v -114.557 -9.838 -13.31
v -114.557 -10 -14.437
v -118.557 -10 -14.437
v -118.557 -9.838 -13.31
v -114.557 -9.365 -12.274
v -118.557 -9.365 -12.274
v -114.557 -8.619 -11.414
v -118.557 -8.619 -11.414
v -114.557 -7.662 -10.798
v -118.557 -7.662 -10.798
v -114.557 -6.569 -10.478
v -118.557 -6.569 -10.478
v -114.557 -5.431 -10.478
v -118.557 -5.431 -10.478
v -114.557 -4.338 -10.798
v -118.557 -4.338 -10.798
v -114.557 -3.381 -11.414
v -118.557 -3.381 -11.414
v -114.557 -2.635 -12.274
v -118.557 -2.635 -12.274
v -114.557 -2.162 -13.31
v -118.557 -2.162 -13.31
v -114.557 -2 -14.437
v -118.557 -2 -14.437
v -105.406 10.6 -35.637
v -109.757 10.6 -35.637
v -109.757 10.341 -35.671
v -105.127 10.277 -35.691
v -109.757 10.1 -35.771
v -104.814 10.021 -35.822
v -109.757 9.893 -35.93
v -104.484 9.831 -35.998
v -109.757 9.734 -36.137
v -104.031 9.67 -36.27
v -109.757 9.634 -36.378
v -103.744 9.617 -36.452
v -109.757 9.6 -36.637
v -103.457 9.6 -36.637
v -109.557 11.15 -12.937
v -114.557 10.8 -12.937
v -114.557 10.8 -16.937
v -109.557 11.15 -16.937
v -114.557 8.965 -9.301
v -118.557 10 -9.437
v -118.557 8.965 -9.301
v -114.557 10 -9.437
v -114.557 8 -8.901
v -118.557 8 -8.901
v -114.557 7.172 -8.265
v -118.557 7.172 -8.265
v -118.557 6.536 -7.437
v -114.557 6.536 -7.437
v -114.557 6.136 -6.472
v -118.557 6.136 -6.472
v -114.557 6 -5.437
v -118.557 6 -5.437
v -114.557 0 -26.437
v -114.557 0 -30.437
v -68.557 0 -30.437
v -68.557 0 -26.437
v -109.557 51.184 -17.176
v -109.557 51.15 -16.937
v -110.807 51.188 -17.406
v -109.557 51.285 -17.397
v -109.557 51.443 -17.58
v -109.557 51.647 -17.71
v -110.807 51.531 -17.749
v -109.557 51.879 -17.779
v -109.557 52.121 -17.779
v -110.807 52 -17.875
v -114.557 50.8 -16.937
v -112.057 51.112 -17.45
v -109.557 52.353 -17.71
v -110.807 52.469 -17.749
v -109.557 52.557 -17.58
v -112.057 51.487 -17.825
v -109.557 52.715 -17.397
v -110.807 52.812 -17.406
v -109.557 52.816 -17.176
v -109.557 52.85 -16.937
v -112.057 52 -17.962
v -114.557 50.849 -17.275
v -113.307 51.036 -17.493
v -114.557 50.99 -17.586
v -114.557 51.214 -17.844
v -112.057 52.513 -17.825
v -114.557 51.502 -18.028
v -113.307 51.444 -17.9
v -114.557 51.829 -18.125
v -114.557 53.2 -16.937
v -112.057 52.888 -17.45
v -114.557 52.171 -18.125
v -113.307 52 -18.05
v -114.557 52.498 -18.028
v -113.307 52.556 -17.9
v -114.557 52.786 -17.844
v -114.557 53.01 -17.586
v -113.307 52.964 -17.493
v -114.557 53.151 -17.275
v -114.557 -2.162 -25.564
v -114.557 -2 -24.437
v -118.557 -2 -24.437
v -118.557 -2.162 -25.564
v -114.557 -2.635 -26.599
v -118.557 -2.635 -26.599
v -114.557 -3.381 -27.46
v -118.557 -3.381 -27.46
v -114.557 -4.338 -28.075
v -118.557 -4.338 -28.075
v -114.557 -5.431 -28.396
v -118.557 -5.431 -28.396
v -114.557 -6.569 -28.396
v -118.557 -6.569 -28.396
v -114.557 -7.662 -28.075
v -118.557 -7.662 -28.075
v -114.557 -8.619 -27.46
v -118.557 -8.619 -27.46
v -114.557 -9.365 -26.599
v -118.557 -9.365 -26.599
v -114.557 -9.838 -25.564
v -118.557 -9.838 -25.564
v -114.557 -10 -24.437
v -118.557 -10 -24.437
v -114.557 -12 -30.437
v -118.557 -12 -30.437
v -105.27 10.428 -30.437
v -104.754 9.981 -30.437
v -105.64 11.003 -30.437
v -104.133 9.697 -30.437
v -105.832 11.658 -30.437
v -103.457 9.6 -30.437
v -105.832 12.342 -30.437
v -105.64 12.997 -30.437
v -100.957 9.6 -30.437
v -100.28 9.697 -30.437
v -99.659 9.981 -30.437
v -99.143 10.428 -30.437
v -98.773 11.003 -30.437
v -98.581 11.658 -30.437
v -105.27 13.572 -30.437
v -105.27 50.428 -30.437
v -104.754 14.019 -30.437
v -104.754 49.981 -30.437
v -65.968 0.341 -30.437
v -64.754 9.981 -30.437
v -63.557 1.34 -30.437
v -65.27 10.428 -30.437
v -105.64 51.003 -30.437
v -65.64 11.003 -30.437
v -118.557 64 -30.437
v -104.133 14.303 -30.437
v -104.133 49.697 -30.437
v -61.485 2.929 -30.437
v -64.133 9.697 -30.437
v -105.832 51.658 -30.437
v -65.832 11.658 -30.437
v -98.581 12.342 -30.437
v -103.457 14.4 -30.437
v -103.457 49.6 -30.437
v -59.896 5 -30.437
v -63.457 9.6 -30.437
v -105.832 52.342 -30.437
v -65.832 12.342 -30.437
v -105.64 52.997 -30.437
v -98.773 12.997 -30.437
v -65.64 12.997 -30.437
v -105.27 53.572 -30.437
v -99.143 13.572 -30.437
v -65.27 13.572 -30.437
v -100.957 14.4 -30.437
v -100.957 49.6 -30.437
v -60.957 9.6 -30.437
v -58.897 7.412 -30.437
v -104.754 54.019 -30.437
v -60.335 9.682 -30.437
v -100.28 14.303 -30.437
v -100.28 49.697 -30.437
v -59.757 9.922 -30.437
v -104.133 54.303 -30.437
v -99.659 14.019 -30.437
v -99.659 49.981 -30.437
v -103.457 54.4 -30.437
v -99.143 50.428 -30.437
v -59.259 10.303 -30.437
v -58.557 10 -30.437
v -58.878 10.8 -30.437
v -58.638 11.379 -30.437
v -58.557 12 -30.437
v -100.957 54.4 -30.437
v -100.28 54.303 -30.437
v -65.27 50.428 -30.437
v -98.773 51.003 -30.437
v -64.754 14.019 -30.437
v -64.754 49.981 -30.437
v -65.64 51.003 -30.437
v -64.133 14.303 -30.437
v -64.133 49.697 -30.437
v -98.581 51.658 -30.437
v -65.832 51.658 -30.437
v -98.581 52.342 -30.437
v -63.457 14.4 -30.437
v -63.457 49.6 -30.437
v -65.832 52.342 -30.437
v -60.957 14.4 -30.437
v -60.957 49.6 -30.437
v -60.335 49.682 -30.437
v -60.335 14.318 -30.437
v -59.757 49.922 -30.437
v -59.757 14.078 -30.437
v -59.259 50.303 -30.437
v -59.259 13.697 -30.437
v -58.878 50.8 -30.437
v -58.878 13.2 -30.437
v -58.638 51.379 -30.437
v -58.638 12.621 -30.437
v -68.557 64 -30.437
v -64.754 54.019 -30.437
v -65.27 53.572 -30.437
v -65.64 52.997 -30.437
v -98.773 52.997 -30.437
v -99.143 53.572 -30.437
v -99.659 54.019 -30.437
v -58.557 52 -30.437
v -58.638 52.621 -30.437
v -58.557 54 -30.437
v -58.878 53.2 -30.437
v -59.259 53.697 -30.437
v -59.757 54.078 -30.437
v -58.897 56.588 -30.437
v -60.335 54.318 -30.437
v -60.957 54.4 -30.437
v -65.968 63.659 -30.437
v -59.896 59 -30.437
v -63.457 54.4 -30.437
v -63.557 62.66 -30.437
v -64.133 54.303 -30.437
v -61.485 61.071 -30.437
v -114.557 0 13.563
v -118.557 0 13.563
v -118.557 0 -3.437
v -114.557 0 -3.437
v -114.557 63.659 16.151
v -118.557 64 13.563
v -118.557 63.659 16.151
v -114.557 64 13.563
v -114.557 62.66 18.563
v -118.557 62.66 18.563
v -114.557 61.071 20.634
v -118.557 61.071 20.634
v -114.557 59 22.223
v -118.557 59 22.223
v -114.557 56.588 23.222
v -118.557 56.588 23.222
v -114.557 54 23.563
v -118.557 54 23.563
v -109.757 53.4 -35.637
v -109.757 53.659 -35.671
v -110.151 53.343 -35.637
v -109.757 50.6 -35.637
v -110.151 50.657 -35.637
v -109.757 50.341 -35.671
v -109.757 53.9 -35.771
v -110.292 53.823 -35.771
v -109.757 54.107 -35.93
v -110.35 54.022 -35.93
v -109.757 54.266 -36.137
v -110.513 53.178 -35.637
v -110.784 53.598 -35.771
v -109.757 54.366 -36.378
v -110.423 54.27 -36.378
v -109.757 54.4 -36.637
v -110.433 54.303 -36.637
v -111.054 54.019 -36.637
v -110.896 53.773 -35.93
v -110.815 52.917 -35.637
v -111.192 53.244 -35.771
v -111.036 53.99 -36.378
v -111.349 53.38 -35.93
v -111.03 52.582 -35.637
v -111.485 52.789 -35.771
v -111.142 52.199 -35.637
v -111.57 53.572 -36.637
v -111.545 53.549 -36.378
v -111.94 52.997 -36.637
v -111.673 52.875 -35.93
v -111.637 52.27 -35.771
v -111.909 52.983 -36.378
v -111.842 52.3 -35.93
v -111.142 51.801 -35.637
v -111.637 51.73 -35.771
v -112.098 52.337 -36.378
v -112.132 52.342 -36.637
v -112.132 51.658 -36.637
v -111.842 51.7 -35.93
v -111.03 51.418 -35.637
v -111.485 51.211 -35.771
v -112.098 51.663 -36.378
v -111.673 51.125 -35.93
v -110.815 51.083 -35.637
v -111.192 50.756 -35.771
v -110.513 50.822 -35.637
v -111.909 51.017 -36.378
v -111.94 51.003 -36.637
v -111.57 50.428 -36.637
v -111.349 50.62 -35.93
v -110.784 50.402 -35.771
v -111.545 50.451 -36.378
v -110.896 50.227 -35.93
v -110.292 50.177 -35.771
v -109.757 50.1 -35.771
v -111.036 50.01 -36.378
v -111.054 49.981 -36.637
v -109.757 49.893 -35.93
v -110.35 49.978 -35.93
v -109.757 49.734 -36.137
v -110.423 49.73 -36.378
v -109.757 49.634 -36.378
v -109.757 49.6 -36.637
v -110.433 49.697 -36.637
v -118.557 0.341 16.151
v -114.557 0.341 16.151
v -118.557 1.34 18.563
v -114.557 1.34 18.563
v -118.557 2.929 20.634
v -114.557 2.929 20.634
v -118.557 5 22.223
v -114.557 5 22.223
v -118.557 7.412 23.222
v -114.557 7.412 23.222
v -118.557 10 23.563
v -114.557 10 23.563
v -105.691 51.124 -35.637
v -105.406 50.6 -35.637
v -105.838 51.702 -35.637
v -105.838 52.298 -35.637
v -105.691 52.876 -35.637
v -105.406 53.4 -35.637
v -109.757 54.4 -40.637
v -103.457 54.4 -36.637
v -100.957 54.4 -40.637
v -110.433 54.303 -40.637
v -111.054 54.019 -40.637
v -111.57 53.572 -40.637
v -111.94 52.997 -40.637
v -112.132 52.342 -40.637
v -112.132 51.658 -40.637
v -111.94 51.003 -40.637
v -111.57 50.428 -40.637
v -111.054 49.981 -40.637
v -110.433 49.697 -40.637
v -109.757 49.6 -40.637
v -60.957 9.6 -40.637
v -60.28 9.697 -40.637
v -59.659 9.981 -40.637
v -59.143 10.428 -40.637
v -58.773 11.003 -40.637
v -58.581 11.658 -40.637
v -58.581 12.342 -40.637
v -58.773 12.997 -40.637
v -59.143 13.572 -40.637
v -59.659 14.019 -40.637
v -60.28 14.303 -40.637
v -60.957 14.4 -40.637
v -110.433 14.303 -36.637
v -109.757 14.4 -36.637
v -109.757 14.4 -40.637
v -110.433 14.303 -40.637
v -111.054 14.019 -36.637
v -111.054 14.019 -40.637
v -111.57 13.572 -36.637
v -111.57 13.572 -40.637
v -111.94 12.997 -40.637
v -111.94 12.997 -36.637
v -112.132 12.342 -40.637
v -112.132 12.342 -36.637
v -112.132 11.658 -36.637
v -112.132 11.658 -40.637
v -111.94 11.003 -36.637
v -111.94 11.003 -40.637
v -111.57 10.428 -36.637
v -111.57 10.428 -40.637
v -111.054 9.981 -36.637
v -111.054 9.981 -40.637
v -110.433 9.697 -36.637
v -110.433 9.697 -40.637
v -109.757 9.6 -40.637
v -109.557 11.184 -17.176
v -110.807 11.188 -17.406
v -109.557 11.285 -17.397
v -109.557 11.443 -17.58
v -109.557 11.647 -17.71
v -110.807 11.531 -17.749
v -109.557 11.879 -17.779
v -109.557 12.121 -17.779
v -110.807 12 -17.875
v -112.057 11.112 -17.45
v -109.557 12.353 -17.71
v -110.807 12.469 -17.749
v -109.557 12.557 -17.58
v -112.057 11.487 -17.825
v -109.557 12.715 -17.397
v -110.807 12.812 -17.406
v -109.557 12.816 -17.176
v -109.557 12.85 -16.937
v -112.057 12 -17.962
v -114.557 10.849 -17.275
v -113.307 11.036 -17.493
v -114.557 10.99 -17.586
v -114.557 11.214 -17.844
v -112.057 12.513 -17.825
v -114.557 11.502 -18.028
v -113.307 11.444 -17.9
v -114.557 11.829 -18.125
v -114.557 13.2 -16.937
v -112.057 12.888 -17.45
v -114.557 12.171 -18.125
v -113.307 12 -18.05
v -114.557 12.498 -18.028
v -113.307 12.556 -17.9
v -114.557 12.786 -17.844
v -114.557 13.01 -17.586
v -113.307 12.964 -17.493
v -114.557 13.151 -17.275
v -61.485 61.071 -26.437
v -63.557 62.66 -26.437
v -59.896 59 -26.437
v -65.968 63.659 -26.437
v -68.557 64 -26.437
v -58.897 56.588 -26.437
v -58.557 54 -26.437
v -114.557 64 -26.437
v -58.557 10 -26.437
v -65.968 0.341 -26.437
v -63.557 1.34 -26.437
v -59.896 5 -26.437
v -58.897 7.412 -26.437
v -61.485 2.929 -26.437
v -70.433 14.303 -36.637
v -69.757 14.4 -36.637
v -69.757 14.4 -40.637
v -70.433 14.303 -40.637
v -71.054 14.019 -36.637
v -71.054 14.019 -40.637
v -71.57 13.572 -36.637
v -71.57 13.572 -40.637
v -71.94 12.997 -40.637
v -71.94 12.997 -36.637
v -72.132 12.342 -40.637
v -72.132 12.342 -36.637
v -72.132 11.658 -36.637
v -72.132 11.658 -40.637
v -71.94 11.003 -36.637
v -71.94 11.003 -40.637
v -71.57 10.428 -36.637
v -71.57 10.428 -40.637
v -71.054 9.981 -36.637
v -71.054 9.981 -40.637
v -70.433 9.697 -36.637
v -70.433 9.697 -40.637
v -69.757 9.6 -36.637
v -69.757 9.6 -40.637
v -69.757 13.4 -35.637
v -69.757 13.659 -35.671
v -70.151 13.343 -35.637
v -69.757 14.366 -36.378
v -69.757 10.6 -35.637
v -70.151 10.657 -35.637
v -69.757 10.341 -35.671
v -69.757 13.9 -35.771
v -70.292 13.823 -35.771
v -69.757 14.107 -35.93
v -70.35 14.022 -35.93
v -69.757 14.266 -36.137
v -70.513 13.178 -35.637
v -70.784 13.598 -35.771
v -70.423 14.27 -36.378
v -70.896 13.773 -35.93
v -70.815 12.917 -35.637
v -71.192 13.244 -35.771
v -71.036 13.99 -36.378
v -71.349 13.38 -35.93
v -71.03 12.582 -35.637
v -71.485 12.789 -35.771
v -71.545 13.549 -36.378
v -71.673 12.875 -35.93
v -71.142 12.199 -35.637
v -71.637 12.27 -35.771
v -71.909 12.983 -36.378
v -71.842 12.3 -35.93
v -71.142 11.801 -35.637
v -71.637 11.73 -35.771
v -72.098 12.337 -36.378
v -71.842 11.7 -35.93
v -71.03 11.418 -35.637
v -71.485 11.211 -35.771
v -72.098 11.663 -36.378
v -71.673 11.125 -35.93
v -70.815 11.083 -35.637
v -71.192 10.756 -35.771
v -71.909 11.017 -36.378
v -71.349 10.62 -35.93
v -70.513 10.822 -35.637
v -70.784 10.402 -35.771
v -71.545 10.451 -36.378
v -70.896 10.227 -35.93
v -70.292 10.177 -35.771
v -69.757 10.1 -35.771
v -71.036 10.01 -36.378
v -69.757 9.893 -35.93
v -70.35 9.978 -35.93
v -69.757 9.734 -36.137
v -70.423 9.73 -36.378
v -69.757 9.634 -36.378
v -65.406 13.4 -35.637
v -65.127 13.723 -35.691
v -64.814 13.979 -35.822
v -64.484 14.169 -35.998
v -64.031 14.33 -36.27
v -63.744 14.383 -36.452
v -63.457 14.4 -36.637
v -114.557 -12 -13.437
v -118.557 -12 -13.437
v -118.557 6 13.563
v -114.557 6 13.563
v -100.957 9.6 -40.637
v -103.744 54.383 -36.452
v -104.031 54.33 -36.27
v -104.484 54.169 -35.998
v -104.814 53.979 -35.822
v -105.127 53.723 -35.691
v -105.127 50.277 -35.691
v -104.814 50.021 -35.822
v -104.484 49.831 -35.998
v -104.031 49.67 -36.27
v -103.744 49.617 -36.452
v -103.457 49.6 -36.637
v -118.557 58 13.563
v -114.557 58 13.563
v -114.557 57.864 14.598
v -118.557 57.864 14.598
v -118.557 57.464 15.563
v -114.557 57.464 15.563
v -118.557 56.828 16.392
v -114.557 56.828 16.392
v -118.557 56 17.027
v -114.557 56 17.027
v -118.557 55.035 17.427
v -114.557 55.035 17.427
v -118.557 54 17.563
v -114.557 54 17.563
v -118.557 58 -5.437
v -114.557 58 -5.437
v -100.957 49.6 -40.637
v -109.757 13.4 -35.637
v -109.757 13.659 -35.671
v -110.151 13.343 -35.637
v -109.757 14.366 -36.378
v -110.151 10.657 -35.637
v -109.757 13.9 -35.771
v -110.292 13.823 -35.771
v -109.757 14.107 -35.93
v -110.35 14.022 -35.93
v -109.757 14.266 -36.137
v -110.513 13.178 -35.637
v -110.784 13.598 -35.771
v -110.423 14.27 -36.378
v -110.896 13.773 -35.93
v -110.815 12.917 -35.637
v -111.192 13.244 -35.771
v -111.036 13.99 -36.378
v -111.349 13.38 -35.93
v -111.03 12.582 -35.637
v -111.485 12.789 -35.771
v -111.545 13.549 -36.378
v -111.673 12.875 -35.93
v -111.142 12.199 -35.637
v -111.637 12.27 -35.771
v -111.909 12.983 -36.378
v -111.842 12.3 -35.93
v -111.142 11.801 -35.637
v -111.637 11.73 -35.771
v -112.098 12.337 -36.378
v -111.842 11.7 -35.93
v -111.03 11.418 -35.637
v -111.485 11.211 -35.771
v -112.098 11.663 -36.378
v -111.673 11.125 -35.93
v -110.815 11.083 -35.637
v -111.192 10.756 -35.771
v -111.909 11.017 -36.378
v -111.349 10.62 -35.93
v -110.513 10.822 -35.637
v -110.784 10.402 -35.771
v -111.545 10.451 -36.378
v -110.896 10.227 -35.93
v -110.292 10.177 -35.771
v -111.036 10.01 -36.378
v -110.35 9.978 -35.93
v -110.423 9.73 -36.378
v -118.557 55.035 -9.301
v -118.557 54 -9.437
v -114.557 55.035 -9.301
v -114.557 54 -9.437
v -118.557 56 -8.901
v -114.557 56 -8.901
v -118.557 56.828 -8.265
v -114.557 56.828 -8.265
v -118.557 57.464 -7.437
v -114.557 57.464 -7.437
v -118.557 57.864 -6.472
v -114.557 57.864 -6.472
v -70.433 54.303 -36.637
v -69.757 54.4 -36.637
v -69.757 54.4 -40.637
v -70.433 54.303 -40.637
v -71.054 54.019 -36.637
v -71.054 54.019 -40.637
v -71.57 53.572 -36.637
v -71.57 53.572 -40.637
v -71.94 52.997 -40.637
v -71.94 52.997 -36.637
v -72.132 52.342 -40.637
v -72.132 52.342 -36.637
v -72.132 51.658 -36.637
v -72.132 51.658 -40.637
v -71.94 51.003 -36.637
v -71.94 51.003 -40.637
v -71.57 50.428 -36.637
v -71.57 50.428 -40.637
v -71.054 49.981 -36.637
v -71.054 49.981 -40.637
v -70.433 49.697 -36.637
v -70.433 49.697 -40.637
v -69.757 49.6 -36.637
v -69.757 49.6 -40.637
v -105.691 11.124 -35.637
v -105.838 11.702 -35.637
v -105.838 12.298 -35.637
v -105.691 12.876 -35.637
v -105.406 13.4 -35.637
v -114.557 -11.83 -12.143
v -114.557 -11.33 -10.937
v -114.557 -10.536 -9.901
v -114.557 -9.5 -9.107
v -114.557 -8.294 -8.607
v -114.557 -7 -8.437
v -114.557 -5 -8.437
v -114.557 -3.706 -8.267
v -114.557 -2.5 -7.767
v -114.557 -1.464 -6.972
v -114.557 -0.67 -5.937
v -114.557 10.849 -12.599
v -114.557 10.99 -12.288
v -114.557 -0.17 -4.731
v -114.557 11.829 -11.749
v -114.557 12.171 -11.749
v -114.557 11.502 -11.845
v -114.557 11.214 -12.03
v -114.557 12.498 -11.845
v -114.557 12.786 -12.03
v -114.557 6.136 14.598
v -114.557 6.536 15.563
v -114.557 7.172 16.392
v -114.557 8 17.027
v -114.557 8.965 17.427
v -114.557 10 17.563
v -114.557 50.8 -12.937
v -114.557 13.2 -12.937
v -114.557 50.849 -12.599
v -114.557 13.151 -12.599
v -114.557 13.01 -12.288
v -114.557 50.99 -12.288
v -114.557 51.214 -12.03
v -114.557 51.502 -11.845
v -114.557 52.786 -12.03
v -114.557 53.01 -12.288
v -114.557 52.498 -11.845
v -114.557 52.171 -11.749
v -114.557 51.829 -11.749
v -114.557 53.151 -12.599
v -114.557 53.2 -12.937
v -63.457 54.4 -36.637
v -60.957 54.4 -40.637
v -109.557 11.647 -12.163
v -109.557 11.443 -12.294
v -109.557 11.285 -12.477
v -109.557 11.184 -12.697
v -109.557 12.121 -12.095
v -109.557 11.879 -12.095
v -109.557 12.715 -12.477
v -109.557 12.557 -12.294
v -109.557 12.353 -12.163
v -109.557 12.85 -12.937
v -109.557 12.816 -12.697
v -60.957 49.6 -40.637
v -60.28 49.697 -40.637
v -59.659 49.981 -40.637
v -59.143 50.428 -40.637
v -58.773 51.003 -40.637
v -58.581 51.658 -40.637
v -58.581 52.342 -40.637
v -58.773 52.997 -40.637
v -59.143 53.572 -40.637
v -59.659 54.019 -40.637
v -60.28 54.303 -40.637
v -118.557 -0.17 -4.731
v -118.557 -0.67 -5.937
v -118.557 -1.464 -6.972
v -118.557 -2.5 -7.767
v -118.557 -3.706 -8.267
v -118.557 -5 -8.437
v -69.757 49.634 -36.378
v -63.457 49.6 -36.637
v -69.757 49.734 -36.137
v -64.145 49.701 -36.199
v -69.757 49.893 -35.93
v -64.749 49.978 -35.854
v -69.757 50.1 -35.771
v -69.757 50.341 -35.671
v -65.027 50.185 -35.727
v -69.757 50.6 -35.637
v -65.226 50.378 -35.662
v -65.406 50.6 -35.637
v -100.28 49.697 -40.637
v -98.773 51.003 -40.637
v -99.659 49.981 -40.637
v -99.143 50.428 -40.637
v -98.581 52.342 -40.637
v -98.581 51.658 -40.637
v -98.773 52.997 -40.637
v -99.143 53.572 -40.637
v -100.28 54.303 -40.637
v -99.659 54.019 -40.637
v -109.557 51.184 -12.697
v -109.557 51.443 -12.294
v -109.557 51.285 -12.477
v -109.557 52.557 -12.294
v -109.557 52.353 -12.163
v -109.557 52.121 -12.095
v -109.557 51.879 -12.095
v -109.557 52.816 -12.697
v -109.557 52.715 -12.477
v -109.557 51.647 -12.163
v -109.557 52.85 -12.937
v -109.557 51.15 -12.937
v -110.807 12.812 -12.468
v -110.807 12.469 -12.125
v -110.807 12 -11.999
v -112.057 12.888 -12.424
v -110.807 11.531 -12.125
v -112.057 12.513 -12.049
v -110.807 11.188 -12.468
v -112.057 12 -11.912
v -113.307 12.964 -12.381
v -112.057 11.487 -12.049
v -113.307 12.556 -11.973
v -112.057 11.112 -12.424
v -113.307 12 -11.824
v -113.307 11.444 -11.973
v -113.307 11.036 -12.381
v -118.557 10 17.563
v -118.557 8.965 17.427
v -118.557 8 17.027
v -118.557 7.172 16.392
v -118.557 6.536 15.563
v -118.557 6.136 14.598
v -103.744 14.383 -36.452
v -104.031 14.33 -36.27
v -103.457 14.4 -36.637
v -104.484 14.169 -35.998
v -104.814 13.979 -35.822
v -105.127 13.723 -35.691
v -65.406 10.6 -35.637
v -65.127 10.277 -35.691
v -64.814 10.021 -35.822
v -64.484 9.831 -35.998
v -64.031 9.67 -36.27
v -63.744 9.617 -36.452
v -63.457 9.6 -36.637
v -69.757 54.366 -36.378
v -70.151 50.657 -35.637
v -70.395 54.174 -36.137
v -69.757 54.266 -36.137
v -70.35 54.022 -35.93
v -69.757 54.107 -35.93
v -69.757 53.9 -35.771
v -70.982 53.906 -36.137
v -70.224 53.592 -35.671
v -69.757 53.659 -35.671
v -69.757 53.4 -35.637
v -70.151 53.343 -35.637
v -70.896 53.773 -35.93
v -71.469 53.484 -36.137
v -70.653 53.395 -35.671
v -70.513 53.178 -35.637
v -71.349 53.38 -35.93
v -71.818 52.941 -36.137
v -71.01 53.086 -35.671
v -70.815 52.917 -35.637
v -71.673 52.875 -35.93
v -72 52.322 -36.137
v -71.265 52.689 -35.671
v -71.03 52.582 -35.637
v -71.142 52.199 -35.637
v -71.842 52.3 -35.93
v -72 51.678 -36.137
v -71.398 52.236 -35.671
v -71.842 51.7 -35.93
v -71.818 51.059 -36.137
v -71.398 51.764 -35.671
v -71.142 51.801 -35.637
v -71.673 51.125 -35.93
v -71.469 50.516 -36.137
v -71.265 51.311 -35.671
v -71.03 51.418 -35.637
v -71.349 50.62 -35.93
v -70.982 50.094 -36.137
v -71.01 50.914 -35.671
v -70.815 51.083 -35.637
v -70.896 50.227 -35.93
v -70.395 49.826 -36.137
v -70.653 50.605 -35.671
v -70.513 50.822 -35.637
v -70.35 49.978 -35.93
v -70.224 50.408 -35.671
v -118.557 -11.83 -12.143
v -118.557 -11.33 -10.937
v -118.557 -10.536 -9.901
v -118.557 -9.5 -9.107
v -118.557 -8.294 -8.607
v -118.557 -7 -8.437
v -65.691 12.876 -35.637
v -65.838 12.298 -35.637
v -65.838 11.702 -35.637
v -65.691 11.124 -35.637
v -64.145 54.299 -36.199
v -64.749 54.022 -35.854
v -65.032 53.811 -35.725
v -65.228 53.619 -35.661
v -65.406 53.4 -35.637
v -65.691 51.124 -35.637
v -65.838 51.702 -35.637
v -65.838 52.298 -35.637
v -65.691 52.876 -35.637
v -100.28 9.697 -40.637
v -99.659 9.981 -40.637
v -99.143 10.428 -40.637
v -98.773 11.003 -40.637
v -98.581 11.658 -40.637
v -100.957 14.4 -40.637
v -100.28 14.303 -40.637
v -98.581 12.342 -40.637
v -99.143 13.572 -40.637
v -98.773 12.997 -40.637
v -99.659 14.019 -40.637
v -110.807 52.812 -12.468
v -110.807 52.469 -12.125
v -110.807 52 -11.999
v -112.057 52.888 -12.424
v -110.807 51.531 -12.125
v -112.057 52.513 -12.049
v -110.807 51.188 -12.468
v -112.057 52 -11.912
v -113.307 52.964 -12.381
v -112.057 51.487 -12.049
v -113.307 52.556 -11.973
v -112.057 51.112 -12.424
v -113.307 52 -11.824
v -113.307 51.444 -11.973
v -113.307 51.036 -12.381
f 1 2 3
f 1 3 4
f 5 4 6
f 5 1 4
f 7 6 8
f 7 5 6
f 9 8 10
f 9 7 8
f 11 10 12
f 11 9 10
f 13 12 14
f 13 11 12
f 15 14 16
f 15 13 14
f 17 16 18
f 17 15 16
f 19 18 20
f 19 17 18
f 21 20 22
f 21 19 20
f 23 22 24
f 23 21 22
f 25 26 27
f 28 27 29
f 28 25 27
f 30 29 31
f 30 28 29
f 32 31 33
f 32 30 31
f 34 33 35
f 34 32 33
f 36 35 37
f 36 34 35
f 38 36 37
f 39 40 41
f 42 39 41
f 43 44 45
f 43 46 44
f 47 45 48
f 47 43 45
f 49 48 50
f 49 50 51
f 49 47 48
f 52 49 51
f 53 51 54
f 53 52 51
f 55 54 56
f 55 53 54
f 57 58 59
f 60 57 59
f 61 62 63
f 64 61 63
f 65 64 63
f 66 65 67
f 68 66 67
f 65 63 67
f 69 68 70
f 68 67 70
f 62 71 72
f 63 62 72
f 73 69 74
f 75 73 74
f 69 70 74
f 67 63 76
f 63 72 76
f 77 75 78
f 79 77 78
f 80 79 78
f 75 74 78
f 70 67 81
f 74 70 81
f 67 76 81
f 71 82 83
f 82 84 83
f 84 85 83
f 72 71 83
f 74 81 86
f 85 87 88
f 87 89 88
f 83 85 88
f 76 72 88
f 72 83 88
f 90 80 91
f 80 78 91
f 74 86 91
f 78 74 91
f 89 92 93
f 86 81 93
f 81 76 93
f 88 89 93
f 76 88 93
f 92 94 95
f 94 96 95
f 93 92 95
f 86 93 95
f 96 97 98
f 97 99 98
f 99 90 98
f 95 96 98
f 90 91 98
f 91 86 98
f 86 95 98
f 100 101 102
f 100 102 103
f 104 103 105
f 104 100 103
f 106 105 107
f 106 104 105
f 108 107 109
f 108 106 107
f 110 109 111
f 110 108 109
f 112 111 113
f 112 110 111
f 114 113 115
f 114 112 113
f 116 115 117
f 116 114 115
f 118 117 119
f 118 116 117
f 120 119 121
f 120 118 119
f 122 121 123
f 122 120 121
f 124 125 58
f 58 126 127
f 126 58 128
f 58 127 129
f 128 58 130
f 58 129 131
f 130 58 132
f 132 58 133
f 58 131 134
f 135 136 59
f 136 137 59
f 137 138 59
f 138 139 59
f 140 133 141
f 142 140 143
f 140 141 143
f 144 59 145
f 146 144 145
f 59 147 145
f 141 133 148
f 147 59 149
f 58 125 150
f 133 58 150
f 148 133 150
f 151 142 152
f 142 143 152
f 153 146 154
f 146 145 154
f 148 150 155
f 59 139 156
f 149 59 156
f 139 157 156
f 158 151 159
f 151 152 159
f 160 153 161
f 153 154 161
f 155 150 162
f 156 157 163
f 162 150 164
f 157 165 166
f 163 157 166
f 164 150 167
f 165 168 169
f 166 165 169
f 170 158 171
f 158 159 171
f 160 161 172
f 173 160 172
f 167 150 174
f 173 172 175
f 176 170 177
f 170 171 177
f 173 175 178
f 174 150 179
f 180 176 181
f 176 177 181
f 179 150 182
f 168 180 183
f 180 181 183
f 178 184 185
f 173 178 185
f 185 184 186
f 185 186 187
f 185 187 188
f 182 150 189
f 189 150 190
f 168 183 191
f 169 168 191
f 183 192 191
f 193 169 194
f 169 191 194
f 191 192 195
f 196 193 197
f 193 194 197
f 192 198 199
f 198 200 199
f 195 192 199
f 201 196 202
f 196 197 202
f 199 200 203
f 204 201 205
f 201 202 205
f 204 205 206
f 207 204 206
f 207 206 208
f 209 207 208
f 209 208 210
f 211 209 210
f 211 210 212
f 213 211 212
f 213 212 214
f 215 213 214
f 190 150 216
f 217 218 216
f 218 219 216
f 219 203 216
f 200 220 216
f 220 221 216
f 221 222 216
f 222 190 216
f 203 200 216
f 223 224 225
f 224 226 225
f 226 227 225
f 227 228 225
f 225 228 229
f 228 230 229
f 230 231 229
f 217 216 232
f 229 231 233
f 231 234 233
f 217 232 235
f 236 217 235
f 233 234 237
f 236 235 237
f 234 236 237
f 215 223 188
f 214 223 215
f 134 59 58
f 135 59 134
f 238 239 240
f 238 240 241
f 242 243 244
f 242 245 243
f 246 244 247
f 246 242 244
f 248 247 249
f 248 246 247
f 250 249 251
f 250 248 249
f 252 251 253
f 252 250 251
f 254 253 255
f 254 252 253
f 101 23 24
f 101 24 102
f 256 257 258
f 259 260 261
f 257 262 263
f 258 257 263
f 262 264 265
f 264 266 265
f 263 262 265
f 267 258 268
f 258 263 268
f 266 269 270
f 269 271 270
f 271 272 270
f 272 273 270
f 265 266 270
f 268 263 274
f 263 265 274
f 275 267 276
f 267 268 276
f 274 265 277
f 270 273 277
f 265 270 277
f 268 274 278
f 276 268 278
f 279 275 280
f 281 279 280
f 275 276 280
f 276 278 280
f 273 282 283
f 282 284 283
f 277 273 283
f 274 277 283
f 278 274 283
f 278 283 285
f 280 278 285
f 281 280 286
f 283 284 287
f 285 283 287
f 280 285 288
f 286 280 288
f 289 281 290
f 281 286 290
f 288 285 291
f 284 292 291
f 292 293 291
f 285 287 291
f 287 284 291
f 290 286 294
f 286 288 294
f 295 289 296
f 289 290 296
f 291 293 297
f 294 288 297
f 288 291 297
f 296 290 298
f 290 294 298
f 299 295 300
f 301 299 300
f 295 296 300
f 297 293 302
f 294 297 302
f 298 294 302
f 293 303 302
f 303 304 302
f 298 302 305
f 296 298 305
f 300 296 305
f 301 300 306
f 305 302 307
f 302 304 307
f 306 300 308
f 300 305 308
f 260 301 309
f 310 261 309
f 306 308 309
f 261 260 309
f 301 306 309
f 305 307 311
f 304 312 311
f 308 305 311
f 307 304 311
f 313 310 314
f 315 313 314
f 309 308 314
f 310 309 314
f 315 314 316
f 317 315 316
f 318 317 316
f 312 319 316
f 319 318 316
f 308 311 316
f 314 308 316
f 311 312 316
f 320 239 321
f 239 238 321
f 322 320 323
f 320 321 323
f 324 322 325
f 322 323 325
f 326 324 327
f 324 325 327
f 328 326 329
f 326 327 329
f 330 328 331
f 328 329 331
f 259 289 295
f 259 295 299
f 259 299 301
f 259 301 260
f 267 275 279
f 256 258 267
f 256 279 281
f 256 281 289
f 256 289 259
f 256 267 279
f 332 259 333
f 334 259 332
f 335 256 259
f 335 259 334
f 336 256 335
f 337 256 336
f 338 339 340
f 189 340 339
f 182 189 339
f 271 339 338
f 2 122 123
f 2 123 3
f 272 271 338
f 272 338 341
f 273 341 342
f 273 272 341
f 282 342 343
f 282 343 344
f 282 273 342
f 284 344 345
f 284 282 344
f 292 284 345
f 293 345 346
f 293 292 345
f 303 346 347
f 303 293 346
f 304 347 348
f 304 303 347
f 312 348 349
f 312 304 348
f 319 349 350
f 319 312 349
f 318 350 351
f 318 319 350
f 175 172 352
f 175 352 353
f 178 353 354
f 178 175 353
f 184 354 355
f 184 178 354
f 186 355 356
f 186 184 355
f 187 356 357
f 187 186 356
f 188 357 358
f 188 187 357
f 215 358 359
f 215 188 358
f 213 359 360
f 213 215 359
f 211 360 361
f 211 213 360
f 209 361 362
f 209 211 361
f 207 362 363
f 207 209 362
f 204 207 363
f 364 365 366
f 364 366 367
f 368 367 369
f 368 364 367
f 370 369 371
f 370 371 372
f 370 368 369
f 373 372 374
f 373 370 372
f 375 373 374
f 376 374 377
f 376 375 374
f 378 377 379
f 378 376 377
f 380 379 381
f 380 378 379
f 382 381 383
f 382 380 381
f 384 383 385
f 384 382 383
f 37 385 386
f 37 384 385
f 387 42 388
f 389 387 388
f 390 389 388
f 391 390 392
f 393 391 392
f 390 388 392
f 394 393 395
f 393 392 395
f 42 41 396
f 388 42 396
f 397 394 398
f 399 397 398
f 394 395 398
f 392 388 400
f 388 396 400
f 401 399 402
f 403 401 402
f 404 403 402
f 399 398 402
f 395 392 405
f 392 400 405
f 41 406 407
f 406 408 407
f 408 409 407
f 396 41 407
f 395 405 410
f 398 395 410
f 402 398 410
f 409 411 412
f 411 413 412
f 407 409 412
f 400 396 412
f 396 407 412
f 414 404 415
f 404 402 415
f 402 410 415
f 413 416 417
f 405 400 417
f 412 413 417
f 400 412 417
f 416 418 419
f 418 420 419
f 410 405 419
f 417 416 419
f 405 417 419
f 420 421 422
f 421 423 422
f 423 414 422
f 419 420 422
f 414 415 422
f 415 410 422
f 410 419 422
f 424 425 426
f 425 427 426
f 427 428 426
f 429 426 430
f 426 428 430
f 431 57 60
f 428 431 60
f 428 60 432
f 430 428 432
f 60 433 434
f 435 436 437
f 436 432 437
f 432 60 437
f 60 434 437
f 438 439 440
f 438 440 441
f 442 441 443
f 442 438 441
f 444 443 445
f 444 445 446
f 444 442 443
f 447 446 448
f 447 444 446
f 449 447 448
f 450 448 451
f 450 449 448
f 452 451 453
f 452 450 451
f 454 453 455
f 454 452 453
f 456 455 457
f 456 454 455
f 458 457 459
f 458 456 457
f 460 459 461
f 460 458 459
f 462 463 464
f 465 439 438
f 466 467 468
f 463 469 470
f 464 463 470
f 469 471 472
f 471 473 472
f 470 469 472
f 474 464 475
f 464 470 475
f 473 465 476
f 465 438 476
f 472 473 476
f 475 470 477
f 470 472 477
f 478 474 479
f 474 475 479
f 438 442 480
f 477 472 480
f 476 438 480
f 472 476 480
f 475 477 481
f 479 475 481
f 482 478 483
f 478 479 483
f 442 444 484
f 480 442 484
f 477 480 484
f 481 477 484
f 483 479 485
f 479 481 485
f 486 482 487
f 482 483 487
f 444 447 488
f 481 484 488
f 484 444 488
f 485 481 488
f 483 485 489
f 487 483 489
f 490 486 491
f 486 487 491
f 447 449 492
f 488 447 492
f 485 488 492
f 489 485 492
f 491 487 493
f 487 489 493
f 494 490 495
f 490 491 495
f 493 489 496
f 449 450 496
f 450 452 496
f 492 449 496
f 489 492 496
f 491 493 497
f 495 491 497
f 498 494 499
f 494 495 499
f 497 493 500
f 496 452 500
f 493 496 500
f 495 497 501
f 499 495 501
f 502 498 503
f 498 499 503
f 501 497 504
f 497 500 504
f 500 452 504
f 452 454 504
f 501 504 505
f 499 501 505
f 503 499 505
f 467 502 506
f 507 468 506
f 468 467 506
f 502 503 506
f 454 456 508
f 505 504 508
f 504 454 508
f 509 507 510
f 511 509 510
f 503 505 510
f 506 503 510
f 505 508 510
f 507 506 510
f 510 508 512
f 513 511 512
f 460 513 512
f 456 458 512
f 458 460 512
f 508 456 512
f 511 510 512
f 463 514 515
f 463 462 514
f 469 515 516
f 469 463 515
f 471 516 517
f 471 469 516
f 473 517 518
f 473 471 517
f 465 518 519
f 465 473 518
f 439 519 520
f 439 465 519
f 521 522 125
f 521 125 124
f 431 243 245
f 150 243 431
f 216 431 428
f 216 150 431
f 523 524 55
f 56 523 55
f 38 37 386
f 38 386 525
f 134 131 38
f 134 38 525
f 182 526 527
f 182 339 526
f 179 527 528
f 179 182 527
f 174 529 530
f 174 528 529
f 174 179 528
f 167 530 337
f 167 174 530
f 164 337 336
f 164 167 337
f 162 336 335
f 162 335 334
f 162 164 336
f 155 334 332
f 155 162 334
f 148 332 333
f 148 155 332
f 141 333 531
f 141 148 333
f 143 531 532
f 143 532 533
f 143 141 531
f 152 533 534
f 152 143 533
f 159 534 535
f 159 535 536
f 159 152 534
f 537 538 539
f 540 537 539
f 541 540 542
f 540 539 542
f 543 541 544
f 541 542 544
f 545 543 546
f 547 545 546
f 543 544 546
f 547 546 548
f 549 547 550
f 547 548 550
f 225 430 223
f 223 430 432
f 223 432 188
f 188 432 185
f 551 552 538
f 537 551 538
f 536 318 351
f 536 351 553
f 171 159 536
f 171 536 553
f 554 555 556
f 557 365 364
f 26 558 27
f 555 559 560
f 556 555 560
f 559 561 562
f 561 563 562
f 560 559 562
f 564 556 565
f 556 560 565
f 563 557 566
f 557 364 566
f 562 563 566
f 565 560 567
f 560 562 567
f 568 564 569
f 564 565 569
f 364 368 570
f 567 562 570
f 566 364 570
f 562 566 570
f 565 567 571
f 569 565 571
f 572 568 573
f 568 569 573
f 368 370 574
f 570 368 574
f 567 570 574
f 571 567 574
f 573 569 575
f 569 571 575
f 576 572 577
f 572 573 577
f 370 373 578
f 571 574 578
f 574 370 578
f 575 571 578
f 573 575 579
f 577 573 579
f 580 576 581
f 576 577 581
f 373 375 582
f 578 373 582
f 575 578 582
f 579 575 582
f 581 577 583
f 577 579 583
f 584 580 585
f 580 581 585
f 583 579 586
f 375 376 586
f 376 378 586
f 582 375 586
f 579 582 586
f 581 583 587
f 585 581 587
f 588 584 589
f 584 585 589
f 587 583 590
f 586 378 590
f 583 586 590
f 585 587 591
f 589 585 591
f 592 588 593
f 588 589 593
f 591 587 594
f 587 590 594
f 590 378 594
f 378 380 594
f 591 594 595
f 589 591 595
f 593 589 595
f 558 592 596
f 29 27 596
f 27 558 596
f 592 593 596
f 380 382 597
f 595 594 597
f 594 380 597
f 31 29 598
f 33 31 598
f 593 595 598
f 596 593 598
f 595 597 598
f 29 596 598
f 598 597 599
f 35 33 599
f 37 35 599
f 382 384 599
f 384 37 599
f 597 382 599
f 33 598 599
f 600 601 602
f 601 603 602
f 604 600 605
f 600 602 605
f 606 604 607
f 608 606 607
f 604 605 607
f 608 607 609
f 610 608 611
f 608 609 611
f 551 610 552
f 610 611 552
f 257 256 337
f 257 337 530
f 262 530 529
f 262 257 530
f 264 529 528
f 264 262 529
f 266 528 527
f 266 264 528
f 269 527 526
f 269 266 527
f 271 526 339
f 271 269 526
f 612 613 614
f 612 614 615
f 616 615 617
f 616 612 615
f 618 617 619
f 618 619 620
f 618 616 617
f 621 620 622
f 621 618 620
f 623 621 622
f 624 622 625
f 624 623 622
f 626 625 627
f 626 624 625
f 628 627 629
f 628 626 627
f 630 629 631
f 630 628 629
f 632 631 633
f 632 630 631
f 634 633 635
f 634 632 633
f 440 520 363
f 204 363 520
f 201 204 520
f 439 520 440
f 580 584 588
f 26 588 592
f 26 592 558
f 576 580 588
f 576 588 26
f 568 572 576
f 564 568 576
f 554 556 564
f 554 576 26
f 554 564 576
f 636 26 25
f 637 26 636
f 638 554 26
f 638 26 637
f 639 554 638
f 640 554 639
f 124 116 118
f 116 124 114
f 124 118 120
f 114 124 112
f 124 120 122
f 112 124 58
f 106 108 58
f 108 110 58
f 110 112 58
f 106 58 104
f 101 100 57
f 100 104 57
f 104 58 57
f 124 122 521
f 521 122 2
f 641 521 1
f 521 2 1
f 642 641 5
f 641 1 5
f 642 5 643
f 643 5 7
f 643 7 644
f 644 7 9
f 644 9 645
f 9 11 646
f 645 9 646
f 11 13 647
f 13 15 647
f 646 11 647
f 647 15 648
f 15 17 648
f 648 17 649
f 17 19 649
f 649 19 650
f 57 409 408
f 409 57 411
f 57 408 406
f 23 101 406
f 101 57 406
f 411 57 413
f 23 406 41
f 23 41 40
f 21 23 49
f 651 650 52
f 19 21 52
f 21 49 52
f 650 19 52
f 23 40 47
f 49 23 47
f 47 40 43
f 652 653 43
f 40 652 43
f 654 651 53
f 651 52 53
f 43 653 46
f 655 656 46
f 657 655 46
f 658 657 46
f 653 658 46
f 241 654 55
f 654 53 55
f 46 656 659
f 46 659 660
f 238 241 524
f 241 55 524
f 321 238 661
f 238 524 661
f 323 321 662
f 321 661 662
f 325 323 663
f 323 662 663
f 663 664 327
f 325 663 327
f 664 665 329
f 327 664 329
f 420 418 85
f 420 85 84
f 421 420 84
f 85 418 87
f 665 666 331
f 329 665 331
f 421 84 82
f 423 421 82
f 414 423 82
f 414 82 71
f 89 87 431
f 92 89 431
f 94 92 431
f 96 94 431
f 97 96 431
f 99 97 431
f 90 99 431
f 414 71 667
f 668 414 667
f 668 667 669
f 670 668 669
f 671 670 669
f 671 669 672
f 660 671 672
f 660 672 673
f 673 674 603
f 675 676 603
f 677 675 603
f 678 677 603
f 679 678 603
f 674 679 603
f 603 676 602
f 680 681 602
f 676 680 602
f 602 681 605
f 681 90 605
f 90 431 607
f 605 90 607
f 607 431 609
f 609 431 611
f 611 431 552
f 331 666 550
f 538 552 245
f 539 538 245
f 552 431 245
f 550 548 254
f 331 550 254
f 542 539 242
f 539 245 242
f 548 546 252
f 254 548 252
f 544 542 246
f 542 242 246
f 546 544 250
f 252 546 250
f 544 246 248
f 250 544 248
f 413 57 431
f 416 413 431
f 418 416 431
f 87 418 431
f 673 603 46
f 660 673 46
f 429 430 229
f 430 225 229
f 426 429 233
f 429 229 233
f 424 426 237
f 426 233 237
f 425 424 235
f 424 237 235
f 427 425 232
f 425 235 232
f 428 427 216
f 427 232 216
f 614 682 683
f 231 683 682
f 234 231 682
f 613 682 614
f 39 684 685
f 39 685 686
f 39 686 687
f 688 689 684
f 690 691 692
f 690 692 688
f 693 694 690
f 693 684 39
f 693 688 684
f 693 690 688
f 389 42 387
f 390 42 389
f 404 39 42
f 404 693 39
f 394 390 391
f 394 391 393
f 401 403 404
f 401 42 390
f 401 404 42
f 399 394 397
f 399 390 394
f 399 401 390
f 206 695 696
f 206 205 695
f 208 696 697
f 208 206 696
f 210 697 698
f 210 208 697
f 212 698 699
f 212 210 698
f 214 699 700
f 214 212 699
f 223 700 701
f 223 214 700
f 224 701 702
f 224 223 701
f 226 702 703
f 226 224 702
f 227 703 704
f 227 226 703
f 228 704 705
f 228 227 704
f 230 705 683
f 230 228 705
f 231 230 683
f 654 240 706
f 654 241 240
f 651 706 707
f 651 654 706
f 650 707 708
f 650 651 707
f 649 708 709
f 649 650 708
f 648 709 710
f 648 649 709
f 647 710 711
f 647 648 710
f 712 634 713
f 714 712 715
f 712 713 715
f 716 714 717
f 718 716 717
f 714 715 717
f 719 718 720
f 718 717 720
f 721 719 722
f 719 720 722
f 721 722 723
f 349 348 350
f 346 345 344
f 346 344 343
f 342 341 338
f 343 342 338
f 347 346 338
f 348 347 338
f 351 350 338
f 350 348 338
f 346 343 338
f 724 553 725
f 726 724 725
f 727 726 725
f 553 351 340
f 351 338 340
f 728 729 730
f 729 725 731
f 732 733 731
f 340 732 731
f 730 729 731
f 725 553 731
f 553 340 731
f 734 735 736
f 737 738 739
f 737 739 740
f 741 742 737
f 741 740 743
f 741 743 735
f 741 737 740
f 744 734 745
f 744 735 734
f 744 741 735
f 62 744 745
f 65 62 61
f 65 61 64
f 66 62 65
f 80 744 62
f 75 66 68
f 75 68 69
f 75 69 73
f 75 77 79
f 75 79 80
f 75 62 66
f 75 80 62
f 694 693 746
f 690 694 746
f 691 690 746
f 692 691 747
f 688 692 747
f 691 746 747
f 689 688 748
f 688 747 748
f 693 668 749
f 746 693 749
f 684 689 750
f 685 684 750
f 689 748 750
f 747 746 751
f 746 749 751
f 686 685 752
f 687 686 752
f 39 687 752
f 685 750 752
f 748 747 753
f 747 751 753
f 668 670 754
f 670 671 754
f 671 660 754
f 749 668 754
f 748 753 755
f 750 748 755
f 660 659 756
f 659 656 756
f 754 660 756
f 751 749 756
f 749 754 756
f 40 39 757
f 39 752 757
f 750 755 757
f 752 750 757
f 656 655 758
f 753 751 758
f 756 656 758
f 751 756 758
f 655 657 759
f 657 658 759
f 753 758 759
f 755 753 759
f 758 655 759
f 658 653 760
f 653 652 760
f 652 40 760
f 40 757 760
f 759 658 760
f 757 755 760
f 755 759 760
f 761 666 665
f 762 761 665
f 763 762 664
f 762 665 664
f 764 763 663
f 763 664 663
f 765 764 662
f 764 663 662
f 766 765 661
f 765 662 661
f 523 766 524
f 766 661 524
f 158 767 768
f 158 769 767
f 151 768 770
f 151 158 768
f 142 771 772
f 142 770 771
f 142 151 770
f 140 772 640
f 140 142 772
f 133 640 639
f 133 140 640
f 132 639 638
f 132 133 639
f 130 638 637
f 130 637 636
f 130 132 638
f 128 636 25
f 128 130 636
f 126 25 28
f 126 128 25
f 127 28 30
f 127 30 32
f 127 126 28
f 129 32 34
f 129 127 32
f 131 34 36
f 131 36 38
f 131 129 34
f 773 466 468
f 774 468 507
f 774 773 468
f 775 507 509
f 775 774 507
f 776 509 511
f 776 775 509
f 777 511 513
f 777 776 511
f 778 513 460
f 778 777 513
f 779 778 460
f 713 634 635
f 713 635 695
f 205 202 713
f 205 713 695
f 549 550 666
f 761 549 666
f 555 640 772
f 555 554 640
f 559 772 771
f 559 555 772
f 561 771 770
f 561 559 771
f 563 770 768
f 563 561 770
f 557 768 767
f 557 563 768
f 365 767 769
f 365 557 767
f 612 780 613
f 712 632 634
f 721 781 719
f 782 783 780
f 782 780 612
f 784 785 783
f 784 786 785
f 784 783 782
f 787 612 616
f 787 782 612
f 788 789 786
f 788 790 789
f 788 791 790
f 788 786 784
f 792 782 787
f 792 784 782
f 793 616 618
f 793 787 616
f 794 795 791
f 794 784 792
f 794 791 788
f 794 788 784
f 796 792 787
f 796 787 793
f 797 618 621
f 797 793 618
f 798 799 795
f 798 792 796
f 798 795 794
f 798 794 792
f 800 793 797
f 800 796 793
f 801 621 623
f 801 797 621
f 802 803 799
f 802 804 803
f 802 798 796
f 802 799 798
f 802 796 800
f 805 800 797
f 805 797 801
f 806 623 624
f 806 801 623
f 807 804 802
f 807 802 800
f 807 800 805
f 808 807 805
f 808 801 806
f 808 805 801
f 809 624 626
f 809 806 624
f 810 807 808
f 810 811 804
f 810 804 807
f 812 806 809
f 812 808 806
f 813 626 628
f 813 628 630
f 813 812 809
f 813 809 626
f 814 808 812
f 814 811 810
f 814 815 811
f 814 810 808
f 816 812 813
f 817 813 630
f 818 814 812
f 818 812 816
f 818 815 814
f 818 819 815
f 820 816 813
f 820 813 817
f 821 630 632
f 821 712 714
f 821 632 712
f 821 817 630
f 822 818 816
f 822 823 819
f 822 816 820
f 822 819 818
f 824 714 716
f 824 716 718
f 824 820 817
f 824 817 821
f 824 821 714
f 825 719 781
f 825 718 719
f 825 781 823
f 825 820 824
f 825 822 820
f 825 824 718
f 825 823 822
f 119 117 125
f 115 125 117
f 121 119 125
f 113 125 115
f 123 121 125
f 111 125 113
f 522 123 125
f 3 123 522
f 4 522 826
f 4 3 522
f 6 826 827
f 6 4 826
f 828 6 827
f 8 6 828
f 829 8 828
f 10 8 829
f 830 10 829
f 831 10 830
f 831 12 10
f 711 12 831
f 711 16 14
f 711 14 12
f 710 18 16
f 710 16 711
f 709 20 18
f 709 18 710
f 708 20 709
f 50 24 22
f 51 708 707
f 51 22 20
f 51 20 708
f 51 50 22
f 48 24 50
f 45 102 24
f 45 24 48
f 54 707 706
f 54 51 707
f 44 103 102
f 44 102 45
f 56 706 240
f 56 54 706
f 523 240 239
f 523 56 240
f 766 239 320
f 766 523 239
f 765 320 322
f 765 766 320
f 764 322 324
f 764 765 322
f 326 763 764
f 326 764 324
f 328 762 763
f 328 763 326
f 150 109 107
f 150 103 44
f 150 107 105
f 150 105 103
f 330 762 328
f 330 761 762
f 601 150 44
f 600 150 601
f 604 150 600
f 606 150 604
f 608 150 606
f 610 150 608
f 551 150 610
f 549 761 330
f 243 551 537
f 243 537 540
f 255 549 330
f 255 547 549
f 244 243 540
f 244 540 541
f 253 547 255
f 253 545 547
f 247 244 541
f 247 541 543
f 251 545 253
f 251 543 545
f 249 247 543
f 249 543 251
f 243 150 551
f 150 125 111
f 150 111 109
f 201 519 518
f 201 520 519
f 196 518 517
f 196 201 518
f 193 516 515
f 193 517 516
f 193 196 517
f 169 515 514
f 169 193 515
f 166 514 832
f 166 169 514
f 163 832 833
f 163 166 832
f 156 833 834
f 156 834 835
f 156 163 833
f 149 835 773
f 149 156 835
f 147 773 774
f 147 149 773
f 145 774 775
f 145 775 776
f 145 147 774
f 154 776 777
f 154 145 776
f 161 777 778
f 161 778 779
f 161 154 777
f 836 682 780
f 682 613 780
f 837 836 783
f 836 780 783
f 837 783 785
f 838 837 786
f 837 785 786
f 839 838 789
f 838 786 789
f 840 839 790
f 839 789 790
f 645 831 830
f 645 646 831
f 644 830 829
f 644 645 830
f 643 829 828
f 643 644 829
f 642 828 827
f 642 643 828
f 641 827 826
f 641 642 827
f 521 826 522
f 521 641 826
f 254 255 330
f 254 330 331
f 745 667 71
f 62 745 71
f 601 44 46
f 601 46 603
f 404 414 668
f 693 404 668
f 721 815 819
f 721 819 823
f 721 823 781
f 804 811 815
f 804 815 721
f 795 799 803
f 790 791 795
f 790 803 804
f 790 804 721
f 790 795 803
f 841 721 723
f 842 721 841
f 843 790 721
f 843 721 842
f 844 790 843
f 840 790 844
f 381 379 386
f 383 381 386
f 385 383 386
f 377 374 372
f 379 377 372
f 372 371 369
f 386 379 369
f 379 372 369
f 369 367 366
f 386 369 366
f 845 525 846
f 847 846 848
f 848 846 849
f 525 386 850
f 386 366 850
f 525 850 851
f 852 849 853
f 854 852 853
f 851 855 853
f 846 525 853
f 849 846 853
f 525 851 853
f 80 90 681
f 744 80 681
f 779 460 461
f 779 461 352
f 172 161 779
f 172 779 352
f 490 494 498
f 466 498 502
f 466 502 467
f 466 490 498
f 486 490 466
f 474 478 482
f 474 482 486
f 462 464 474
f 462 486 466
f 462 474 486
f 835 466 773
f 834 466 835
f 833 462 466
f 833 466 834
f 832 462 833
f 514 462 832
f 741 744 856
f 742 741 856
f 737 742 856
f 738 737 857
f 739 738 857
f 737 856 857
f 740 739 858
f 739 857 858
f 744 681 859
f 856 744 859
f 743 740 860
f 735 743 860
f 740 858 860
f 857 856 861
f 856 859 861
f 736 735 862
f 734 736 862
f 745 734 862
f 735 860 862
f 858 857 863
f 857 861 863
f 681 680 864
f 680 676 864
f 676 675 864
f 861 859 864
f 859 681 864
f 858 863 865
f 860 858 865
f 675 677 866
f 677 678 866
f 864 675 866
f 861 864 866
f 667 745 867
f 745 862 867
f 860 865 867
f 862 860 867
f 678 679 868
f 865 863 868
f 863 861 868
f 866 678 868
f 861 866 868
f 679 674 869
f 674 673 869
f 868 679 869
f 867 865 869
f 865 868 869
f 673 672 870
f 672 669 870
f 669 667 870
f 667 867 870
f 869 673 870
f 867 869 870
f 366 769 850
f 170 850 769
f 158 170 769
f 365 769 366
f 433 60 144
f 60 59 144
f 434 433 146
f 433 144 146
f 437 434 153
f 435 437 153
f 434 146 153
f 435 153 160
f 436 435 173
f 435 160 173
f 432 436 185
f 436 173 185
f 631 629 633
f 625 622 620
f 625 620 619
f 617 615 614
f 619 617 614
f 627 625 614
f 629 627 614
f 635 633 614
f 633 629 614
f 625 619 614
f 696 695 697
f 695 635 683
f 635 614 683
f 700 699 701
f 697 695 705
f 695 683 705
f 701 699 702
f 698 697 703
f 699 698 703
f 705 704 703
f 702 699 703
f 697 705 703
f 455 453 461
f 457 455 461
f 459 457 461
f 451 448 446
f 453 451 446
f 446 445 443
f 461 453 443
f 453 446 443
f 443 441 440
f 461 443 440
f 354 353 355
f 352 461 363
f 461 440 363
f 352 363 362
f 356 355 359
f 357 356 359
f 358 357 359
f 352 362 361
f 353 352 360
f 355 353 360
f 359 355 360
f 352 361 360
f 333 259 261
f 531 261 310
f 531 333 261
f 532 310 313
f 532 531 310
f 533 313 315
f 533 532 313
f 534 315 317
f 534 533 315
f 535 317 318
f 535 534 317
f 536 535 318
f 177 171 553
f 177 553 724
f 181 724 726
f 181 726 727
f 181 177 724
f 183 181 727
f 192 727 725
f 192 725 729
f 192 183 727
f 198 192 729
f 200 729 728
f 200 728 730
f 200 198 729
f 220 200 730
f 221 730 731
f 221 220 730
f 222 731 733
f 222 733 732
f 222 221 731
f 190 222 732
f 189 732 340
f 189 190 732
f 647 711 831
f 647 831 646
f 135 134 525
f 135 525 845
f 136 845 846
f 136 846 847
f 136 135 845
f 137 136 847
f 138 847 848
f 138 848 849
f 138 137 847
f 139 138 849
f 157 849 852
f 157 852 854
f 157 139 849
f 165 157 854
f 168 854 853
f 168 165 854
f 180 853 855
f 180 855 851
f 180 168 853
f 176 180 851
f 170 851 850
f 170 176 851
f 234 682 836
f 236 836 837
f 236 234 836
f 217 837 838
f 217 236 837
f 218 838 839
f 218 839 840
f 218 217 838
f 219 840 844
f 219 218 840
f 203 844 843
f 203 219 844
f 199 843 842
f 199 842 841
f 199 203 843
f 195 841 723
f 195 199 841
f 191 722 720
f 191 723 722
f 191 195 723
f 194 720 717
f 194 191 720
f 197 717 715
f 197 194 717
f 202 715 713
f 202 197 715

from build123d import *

# Parameters (mm, degrees)
SKETCH_1_W                = 60
SKETCH_1_H                = 4
EXTRUDE_1_DEPTH           = 64
SKETCH_2_W                = 4
SKETCH_2_H                = 64
EXTRUDE_2_DEPTH           = 50
FILLET_1_R                = 10
CUT_EXTRUDE_1_REACH       = 92.324
SKETCH_4_W                = 11
SKETCH_4_H                = 52
EXTRUDE_3_DEPTH           = 4
EXTRUDE_4_DEPTH           = 5
EXTRUDE_4_DRAFT           = 4
EXTRUDE_4_PROFILE_2_DEPTH = 5
EXTRUDE_4_PROFILE_2_DRAFT = 4
FILLET_2_R                = 4
EXTRUDE_5_DEPTH           = 5.2
EXTRUDE_6_DEPTH           = 5
FILLET_3_R                = 1
SKETCH_8_W                = 4
SKETCH_8_H                = 22
EXTRUDE_7_DEPTH           = 12
FILLET_4_R                = 5
CUT_EXTRUDE_2_REACH       = 96.252


with BuildPart() as part:
    # 草图1 → 凸台-拉伸1 (new body)
    with BuildSketch(Plane(origin=(0, 0, 0), x_dir=(1, 0, 0), z_dir=(0, 1, 0))):
        with Locations((-88.556547212, 28.436915988)):
            Rectangle(SKETCH_1_W, SKETCH_1_H)
    extrude(amount=EXTRUDE_1_DEPTH)

    # 草图2 → 凸台-拉伸2 (add)
    with BuildSketch(Plane.XY.offset(-26.436915988)):
        with Locations((-116.556547212, 32)):
            Rectangle(SKETCH_2_W, SKETCH_2_H)
    extrude(amount=EXTRUDE_2_DEPTH)

    # 圆角1
    fillet_1_edges = [part.edges().sort_by_distance(p)[0] for p in [
        (-58.556547212, 64, -28.436915988),
        (-116.556547212, 0, 23.563084012),
        (-116.556547212, 64, 23.563084012),
        (-58.556547212, 0, -28.436915988),
    ]]
    fillet(fillet_1_edges, radius=FILLET_1_R)

    # 草图3 → 切除-拉伸1 (cut, up to next)
    with BuildSketch(Plane(origin=(-114.556547212, 0, 0), x_dir=(0, 0, -1), z_dir=(1, 0, 0)), mode=Mode.PRIVATE) as cut_extrude_1_sk1:
        with BuildLine():
            Line((-17.563084012, 54), (-17.563084012, 10))
            ThreePointArc((-17.563084012, 10), (-16.391511137, 7.171572875), (-13.563084012, 6))
            Line((-13.563084012, 6), (20.436915988, 6))
            Line((20.436915988, 6), (20.436915988, 58))
            Line((20.436915988, 58), (-13.563084012, 58))
            ThreePointArc((-13.563084012, 58), (-16.391511137, 56.828427125), (-17.563084012, 54))
        make_face()
    cut_extrude_1_tool1 = extrude(cut_extrude_1_sk1.sketch, amount=-CUT_EXTRUDE_1_REACH, mode=Mode.PRIVATE) & part.part
    add(cut_extrude_1_tool1.solids().sort_by_distance((-114.556547, 32, -1.500062))[0], mode=Mode.SUBTRACT)


with BuildPart() as body_2:
    # 草图4 → 凸台-拉伸3 (new body)
    with BuildSketch(Plane.ZY.offset(118.556547212)):
        with Locations((-14.936915988, 32)):
            Rectangle(SKETCH_4_W, SKETCH_4_H)
    extrude(amount=-EXTRUDE_3_DEPTH)


with BuildPart() as extrude_4_tool:
    # 草图5 → 凸台-拉伸4 (with draft: the straight prism first)
    with BuildSketch(Plane(origin=(-114.556547212, 0, 0), x_dir=(0, 0, -1), z_dir=(1, 0, 0))):
        with BuildLine():
            ThreePointArc((12.936915988, 53.2), (11.736915988, 52), (12.936915988, 50.8))
            Line((12.936915988, 50.8), (16.936915988, 50.8))
            ThreePointArc((16.936915988, 50.8), (18.136915988, 52), (16.936915988, 53.2))
            Line((16.936915988, 53.2), (12.936915988, 53.2))
        make_face()
    extrude(amount=EXTRUDE_4_DEPTH)
    # 凸台-拉伸4: the draft: its side faces are tilted about the plane it starts from
    extrude_4_sides = [extrude_4_tool.faces().sort_by_distance(p)[0] for p in [
        (-112.056547212, 52, -18.136915988),
        (-112.056547212, 53.2, -14.936915988),
        (-112.056547212, 52, -11.736915988),
        (-112.056547212, 50.8, -14.936915988),
    ]]
    draft(extrude_4_sides, Plane(origin=(-114.556547212, 0, 0), x_dir=(0, 0, -1), z_dir=(1, 0, 0)), EXTRUDE_4_DRAFT)


with BuildPart() as part_1:
    add(part.part)

    # 凸台-拉伸4: add extrude_4_tool
    add(extrude_4_tool.part)

    add(body_2.part)  # 凸台-拉伸4 merges body 2


with BuildPart() as extrude_4_profile_2_tool:
    # 草图5 → 凸台-拉伸4 profile 2 (with draft: the straight prism first)
    with BuildSketch(Plane(origin=(-114.556547212, 0, 0), x_dir=(0, 0, -1), z_dir=(1, 0, 0))):
        with BuildLine():
            ThreePointArc((12.936915988, 13.2), (11.736915988, 12), (12.936915988, 10.8))
            Line((12.936915988, 10.8), (16.936915988, 10.8))
            ThreePointArc((16.936915988, 10.8), (18.136915988, 12), (16.936915988, 13.2))
            Line((16.936915988, 13.2), (12.936915988, 13.2))
        make_face()
    extrude(amount=EXTRUDE_4_PROFILE_2_DEPTH)
    # 凸台-拉伸4 profile 2: the draft: its side faces are tilted about the plane it starts from
    extrude_4_profile_2_sides = [extrude_4_profile_2_tool.faces().sort_by_distance(p)[0] for p in [
        (-112.056547212, 12, -11.736915988),
        (-112.056547212, 10.8, -14.936915988),
        (-112.056547212, 12, -18.136915988),
        (-112.056547212, 13.2, -14.936915988),
    ]]
    draft(extrude_4_profile_2_sides, Plane(origin=(-114.556547212, 0, 0), x_dir=(0, 0, -1), z_dir=(1, 0, 0)), EXTRUDE_4_PROFILE_2_DRAFT)


with BuildPart() as part_2:
    add(part_1.part)

    # 凸台-拉伸4 profile 2: add extrude_4_profile_2_tool
    add(extrude_4_profile_2_tool.part)

    # 圆角2
    fillet_2_edges = [part_2.edges().sort_by_distance(p)[0] for p in [
        (-116.556547212, 58, -9.436915988),
        (-116.556547212, 6, -9.436915988),
    ]]
    fillet(fillet_2_edges, radius=FILLET_2_R)

    # 草图6 → 凸台-拉伸5 (add)
    with BuildSketch(Plane(origin=(0, 0, -30.436915988), x_dir=(-1, 0, 0), z_dir=(0, 0, -1))):
        with BuildLine():
            Line((60.956547212, 54.4), (63.456547212, 54.4))
            ThreePointArc((63.456547212, 54.4), (65.856547212, 52), (63.456547212, 49.6))
            Line((63.456547212, 49.6), (60.956547212, 49.6))
            ThreePointArc((60.956547212, 49.6), (58.556547212, 52), (60.956547212, 54.4))
        make_face()
        with BuildLine():
            Line((100.956547212, 54.4), (103.456547212, 54.4))
            ThreePointArc((103.456547212, 54.4), (105.856547212, 52), (103.456547212, 49.6))
            Line((103.456547212, 49.6), (100.956547212, 49.6))
            ThreePointArc((100.956547212, 49.6), (98.556547212, 52), (100.956547212, 54.4))
        make_face()
        with BuildLine():
            Line((100.956547212, 14.4), (103.456547212, 14.4))
            ThreePointArc((103.456547212, 14.4), (105.856547212, 12), (103.456547212, 9.6))
            Line((103.456547212, 9.6), (100.956547212, 9.6))
            ThreePointArc((100.956547212, 9.6), (98.556547212, 12), (100.956547212, 14.4))
        make_face()
        with BuildLine():
            Line((60.956547212, 14.4), (63.456547212, 14.4))
            ThreePointArc((63.456547212, 14.4), (65.856547212, 12), (63.456547212, 9.6))
            Line((63.456547212, 9.6), (60.956547212, 9.6))
            ThreePointArc((60.956547212, 9.6), (58.556547212, 12), (60.956547212, 14.4))
        make_face()
    extrude(amount=EXTRUDE_5_DEPTH)

    # 草图7 → 凸台-拉伸6 (add)
    with BuildSketch(Plane(origin=(0, 0, -35.636915988), x_dir=(-1, 0, 0), z_dir=(0, 0, -1))):
        with BuildLine():
            Line((60.956547212, 54.4), (69.756547212, 54.4))
            ThreePointArc((69.756547212, 54.4), (72.156547212, 52), (69.756547212, 49.6))
            Line((69.756547212, 49.6), (60.956547212, 49.6))
            ThreePointArc((60.956547212, 49.6), (58.556547212, 52), (60.956547212, 54.4))
        make_face()
        with BuildLine():
            Line((100.956547212, 54.4), (109.756547212, 54.4))
            ThreePointArc((109.756547212, 54.4), (112.156547212, 52), (109.756547212, 49.6))
            Line((109.756547212, 49.6), (100.956547212, 49.6))
            ThreePointArc((100.956547212, 49.6), (98.556547212, 52), (100.956547212, 54.4))
        make_face()
        with BuildLine():
            Line((100.956547212, 14.4), (109.756547212, 14.4))
            ThreePointArc((109.756547212, 14.4), (112.156547212, 12), (109.756547212, 9.6))
            Line((109.756547212, 9.6), (100.956547212, 9.6))
            ThreePointArc((100.956547212, 9.6), (98.556547212, 12), (100.956547212, 14.4))
        make_face()
        with BuildLine():
            Line((60.956547212, 14.4), (69.756547212, 14.4))
            ThreePointArc((69.756547212, 14.4), (72.156547212, 12), (69.756547212, 9.6))
            Line((69.756547212, 9.6), (60.956547212, 9.6))
            ThreePointArc((60.956547212, 9.6), (58.556547212, 12), (60.956547212, 14.4))
        make_face()
    extrude(amount=EXTRUDE_6_DEPTH)

    # 圆角3
    fillet_3_edges = [part_2.edges().sort_by_distance(p)[0] for p in [
        (-66.606547212, 49.6, -35.636915988),
        (-72.156547212, 52, -35.636915988),
        (-66.606547212, 54.4, -35.636915988),
        (-106.606547212, 49.6, -35.636915988),
        (-112.156547212, 52, -35.636915988),
        (-106.606547212, 54.4, -35.636915988),
        (-106.606547212, 9.6, -35.636915988),
        (-112.156547212, 12, -35.636915988),
        (-106.606547212, 14.4, -35.636915988),
        (-66.606547212, 9.6, -35.636915988),
        (-72.156547212, 12, -35.636915988),
        (-66.606547212, 14.4, -35.636915988),
    ]]
    fillet(fillet_3_edges, radius=FILLET_3_R)

    # 草图8 → 凸台-拉伸7 (add)
    with BuildSketch(Plane.XZ):
        with Locations((-116.556547212, -19.436915988)):
            Rectangle(SKETCH_8_W, SKETCH_8_H)
    extrude(amount=EXTRUDE_7_DEPTH)

    # 圆角4
    fillet_4_edges = [part_2.edges().sort_by_distance(p)[0] for p in [
        (-116.556547212, 0, -8.436915988),
        (-116.556547212, -12, -8.436915988),
    ]]
    fillet(fillet_4_edges, radius=FILLET_4_R)

    # 草图9 → 切除-拉伸2 (cut, up to next)
    with BuildSketch(Plane(origin=(-114.556547212, 0, 0), x_dir=(0, 0, -1), z_dir=(1, 0, 0)), mode=Mode.PRIVATE) as cut_extrude_2_sk1:
        with BuildLine():
            Line((14.436915988, -2), (24.436915988, -2))
            ThreePointArc((24.436915988, -2), (28.436915988, -6), (24.436915988, -10))
            Line((24.436915988, -10), (14.436915988, -10))
            ThreePointArc((14.436915988, -10), (10.436915988, -6), (14.436915988, -2))
        make_face()
    cut_extrude_2_tool1 = extrude(cut_extrude_2_sk1.sketch, amount=-CUT_EXTRUDE_2_REACH, mode=Mode.PRIVATE) & part_2.part
    add(cut_extrude_2_tool1.solids().sort_by_distance((-114.556547, -6, -19.436916))[0], mode=Mode.SUBTRACT)


solid = part_2.part
